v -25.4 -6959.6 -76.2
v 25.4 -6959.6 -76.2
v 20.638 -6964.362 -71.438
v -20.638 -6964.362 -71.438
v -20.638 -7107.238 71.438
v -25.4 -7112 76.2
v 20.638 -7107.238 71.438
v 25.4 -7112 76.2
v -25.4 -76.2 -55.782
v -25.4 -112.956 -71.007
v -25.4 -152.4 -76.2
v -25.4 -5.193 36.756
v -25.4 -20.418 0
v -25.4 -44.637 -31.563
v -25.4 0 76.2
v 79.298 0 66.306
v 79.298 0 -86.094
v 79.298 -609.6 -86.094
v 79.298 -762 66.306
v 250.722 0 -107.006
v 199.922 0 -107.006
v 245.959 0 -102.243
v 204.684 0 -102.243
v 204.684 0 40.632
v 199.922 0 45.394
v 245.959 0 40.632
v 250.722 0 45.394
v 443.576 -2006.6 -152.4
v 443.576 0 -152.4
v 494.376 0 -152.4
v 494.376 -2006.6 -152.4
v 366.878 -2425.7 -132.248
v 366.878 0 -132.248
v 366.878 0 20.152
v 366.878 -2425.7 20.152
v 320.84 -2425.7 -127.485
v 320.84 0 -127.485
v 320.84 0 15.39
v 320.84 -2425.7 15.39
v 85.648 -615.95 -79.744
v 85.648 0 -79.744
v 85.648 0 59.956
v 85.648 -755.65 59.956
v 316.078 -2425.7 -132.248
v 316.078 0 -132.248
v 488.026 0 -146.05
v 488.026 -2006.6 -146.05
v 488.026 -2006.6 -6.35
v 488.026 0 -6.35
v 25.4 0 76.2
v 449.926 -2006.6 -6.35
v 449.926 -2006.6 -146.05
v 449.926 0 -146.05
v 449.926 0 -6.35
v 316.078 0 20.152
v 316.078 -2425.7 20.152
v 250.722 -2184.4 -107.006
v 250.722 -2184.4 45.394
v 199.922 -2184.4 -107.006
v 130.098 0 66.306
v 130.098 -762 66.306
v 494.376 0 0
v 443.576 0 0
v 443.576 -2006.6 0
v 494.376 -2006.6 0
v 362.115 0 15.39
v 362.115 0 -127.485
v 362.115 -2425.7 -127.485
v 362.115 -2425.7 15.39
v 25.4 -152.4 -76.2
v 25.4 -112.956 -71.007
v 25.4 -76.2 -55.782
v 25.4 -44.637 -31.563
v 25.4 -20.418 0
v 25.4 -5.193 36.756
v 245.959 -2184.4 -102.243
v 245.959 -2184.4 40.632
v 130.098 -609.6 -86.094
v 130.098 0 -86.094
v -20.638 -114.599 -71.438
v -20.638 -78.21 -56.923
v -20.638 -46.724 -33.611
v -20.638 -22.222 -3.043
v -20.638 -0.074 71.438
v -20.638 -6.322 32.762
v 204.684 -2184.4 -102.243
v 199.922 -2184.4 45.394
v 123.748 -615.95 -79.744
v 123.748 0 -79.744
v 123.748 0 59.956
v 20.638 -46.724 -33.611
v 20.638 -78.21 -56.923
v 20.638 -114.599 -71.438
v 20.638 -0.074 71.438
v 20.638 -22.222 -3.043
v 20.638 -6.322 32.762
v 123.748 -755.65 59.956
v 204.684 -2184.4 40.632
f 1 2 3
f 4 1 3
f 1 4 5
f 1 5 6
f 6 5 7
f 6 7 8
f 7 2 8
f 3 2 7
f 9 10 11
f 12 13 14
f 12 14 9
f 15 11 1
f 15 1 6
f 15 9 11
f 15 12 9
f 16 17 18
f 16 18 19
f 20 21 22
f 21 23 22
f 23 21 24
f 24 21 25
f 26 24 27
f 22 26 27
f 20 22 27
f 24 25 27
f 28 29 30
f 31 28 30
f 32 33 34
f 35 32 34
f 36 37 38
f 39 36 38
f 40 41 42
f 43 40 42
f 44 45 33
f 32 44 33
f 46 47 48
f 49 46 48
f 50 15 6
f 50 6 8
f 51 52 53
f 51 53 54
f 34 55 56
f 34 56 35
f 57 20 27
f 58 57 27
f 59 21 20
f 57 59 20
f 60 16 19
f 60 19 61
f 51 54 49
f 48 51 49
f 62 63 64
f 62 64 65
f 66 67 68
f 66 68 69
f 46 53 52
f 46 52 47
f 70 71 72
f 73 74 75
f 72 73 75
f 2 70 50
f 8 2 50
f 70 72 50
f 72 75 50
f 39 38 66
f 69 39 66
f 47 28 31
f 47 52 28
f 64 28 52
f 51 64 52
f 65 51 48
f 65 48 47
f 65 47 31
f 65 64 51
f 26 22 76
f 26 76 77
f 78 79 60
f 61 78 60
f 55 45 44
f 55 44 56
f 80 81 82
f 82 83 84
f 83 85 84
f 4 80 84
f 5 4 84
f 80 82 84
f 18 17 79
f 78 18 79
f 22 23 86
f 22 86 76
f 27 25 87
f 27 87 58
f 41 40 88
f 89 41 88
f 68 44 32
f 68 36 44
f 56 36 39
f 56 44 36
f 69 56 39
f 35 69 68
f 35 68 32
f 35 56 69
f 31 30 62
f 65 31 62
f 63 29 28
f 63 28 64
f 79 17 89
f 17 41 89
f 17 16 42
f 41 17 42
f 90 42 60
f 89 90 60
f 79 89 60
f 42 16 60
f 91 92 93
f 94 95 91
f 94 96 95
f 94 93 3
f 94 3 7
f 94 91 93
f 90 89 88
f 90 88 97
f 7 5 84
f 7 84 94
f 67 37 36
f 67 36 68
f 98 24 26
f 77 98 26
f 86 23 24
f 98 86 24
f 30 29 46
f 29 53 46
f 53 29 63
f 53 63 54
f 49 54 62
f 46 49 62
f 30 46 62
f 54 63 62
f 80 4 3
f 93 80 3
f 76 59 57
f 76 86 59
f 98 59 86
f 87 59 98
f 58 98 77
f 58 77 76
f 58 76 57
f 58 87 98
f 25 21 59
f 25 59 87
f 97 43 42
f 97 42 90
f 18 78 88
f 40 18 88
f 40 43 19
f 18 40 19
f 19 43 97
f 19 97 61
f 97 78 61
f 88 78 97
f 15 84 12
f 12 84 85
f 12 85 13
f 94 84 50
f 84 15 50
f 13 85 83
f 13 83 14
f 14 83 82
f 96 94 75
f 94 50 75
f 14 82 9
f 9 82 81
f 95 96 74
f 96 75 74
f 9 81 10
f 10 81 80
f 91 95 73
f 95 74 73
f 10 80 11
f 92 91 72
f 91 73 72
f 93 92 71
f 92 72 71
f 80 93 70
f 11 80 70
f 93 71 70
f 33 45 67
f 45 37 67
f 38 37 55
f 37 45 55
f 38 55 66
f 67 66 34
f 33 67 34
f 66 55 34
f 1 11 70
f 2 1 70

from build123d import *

# Parameters (mm, degrees)
F0_W      = 50.8
F0_H      = 152.4
F0_W_2    = 41.275
F0_H_2    = 142.875
F1_DEPTH  = 7112
F2_W      = 50.8
F2_H      = 210.6431499124
F3_ANGLE  = 90
F5_DEPTH  = 50.801
F6_W      = 50.8
F6_H      = 152.4
F6_W_2    = 38.1
F6_H_2    = 139.7
F7_DEPTH  = 762
F9_DEPTH  = 155.4992832909
F10_W     = 50.8
F10_H     = 152.4
F10_W_2   = 41.275
F10_H_2   = 142.875
F11_DEPTH = 2184.4
F12_W     = 50.8
F12_H     = 152.4
F12_W_2   = 41.275
F12_H_2   = 142.875
F13_DEPTH = 2425.7
F14_W     = 50.8
F14_H     = 152.4
F14_W_2   = 38.1
F14_H_2   = 139.7
F15_DEPTH = 2006.6


with BuildPart() as f1:
    # F0 (on Front) → F1 (new body)
    with BuildSketch(Plane.XZ):
        Rectangle(F0_W, F0_H)
        Rectangle(F0_W_2, F0_H_2, mode=Mode.SUBTRACT)
    extrude(amount=F1_DEPTH)

    # F2 (on face) → F3 (revolve, cut)
    with BuildSketch(Plane.XY.offset(76.2)):
        with Locations((0, 105.3215749562)):
            Rectangle(F2_W, F2_H)
    revolve(axis=Axis((0, -152.4, 76.2), (-1, 0, 0)), revolution_arc=F3_ANGLE, mode=Mode.SUBTRACT)

    # F4 (on face) → F5 (cut, through all)
    with BuildSketch(Plane.YZ.offset(25.4)):
        Polygon((-6959.6, -76.2), (-7112, 76.2), (-7112, -76.2), align=None)
    extrude(amount=-F5_DEPTH, mode=Mode.SUBTRACT)


with BuildPart() as f7:
    # F6 (on Front) → F7 (new body)
    with BuildSketch(Plane.XZ):
        with Locations((104.6982832909, -9.8942993313)):
            Rectangle(F6_W, F6_H)
        with Locations((104.6982832909, -9.8942993313)):
            Rectangle(F6_W_2, F6_H_2, mode=Mode.SUBTRACT)
    extrude(amount=F7_DEPTH)

    # F8 (on face) → F9 (cut, through all)
    with BuildSketch(Plane.YZ.offset(130.0982832909)):
        Polygon((-609.6, -86.0942993313), (-762, 66.3057006687), (-762, -86.0942993313), align=None)
    extrude(amount=-F9_DEPTH, mode=Mode.SUBTRACT)


with BuildPart() as f11:
    # F10 (on Front) → F11 (new body)
    with BuildSketch(Plane.XZ):
        with Locations((225.3219910622, -30.8057749748)):
            Rectangle(F10_W, F10_H)
        with Locations((225.3219910622, -30.8057749748)):
            Rectangle(F10_W_2, F10_H_2, mode=Mode.SUBTRACT)
    extrude(amount=F11_DEPTH)


with BuildPart() as f13:
    # F12 (on Front) → F13 (new body)
    with BuildSketch(Plane.XZ):
        with Locations((341.4777048588, -56.0477459908)):
            Rectangle(F12_W, F12_H)
        with Locations((341.4777048588, -56.0477459908)):
            Rectangle(F12_W_2, F12_H_2, mode=Mode.SUBTRACT)
    extrude(amount=F13_DEPTH)


with BuildPart() as f15:
    # F14 (on Front) → F15 (new body)
    with BuildSketch(Plane.XZ):
        with Locations((468.9760974884, -76.2)):
            Rectangle(F14_W, F14_H)
        with Locations((468.9760974884, -76.2)):
            Rectangle(F14_W_2, F14_H_2, mode=Mode.SUBTRACT)
    extrude(amount=F15_DEPTH)


solid = Compound([f1.part, f7.part, f11.part, f13.part, f15.part])
